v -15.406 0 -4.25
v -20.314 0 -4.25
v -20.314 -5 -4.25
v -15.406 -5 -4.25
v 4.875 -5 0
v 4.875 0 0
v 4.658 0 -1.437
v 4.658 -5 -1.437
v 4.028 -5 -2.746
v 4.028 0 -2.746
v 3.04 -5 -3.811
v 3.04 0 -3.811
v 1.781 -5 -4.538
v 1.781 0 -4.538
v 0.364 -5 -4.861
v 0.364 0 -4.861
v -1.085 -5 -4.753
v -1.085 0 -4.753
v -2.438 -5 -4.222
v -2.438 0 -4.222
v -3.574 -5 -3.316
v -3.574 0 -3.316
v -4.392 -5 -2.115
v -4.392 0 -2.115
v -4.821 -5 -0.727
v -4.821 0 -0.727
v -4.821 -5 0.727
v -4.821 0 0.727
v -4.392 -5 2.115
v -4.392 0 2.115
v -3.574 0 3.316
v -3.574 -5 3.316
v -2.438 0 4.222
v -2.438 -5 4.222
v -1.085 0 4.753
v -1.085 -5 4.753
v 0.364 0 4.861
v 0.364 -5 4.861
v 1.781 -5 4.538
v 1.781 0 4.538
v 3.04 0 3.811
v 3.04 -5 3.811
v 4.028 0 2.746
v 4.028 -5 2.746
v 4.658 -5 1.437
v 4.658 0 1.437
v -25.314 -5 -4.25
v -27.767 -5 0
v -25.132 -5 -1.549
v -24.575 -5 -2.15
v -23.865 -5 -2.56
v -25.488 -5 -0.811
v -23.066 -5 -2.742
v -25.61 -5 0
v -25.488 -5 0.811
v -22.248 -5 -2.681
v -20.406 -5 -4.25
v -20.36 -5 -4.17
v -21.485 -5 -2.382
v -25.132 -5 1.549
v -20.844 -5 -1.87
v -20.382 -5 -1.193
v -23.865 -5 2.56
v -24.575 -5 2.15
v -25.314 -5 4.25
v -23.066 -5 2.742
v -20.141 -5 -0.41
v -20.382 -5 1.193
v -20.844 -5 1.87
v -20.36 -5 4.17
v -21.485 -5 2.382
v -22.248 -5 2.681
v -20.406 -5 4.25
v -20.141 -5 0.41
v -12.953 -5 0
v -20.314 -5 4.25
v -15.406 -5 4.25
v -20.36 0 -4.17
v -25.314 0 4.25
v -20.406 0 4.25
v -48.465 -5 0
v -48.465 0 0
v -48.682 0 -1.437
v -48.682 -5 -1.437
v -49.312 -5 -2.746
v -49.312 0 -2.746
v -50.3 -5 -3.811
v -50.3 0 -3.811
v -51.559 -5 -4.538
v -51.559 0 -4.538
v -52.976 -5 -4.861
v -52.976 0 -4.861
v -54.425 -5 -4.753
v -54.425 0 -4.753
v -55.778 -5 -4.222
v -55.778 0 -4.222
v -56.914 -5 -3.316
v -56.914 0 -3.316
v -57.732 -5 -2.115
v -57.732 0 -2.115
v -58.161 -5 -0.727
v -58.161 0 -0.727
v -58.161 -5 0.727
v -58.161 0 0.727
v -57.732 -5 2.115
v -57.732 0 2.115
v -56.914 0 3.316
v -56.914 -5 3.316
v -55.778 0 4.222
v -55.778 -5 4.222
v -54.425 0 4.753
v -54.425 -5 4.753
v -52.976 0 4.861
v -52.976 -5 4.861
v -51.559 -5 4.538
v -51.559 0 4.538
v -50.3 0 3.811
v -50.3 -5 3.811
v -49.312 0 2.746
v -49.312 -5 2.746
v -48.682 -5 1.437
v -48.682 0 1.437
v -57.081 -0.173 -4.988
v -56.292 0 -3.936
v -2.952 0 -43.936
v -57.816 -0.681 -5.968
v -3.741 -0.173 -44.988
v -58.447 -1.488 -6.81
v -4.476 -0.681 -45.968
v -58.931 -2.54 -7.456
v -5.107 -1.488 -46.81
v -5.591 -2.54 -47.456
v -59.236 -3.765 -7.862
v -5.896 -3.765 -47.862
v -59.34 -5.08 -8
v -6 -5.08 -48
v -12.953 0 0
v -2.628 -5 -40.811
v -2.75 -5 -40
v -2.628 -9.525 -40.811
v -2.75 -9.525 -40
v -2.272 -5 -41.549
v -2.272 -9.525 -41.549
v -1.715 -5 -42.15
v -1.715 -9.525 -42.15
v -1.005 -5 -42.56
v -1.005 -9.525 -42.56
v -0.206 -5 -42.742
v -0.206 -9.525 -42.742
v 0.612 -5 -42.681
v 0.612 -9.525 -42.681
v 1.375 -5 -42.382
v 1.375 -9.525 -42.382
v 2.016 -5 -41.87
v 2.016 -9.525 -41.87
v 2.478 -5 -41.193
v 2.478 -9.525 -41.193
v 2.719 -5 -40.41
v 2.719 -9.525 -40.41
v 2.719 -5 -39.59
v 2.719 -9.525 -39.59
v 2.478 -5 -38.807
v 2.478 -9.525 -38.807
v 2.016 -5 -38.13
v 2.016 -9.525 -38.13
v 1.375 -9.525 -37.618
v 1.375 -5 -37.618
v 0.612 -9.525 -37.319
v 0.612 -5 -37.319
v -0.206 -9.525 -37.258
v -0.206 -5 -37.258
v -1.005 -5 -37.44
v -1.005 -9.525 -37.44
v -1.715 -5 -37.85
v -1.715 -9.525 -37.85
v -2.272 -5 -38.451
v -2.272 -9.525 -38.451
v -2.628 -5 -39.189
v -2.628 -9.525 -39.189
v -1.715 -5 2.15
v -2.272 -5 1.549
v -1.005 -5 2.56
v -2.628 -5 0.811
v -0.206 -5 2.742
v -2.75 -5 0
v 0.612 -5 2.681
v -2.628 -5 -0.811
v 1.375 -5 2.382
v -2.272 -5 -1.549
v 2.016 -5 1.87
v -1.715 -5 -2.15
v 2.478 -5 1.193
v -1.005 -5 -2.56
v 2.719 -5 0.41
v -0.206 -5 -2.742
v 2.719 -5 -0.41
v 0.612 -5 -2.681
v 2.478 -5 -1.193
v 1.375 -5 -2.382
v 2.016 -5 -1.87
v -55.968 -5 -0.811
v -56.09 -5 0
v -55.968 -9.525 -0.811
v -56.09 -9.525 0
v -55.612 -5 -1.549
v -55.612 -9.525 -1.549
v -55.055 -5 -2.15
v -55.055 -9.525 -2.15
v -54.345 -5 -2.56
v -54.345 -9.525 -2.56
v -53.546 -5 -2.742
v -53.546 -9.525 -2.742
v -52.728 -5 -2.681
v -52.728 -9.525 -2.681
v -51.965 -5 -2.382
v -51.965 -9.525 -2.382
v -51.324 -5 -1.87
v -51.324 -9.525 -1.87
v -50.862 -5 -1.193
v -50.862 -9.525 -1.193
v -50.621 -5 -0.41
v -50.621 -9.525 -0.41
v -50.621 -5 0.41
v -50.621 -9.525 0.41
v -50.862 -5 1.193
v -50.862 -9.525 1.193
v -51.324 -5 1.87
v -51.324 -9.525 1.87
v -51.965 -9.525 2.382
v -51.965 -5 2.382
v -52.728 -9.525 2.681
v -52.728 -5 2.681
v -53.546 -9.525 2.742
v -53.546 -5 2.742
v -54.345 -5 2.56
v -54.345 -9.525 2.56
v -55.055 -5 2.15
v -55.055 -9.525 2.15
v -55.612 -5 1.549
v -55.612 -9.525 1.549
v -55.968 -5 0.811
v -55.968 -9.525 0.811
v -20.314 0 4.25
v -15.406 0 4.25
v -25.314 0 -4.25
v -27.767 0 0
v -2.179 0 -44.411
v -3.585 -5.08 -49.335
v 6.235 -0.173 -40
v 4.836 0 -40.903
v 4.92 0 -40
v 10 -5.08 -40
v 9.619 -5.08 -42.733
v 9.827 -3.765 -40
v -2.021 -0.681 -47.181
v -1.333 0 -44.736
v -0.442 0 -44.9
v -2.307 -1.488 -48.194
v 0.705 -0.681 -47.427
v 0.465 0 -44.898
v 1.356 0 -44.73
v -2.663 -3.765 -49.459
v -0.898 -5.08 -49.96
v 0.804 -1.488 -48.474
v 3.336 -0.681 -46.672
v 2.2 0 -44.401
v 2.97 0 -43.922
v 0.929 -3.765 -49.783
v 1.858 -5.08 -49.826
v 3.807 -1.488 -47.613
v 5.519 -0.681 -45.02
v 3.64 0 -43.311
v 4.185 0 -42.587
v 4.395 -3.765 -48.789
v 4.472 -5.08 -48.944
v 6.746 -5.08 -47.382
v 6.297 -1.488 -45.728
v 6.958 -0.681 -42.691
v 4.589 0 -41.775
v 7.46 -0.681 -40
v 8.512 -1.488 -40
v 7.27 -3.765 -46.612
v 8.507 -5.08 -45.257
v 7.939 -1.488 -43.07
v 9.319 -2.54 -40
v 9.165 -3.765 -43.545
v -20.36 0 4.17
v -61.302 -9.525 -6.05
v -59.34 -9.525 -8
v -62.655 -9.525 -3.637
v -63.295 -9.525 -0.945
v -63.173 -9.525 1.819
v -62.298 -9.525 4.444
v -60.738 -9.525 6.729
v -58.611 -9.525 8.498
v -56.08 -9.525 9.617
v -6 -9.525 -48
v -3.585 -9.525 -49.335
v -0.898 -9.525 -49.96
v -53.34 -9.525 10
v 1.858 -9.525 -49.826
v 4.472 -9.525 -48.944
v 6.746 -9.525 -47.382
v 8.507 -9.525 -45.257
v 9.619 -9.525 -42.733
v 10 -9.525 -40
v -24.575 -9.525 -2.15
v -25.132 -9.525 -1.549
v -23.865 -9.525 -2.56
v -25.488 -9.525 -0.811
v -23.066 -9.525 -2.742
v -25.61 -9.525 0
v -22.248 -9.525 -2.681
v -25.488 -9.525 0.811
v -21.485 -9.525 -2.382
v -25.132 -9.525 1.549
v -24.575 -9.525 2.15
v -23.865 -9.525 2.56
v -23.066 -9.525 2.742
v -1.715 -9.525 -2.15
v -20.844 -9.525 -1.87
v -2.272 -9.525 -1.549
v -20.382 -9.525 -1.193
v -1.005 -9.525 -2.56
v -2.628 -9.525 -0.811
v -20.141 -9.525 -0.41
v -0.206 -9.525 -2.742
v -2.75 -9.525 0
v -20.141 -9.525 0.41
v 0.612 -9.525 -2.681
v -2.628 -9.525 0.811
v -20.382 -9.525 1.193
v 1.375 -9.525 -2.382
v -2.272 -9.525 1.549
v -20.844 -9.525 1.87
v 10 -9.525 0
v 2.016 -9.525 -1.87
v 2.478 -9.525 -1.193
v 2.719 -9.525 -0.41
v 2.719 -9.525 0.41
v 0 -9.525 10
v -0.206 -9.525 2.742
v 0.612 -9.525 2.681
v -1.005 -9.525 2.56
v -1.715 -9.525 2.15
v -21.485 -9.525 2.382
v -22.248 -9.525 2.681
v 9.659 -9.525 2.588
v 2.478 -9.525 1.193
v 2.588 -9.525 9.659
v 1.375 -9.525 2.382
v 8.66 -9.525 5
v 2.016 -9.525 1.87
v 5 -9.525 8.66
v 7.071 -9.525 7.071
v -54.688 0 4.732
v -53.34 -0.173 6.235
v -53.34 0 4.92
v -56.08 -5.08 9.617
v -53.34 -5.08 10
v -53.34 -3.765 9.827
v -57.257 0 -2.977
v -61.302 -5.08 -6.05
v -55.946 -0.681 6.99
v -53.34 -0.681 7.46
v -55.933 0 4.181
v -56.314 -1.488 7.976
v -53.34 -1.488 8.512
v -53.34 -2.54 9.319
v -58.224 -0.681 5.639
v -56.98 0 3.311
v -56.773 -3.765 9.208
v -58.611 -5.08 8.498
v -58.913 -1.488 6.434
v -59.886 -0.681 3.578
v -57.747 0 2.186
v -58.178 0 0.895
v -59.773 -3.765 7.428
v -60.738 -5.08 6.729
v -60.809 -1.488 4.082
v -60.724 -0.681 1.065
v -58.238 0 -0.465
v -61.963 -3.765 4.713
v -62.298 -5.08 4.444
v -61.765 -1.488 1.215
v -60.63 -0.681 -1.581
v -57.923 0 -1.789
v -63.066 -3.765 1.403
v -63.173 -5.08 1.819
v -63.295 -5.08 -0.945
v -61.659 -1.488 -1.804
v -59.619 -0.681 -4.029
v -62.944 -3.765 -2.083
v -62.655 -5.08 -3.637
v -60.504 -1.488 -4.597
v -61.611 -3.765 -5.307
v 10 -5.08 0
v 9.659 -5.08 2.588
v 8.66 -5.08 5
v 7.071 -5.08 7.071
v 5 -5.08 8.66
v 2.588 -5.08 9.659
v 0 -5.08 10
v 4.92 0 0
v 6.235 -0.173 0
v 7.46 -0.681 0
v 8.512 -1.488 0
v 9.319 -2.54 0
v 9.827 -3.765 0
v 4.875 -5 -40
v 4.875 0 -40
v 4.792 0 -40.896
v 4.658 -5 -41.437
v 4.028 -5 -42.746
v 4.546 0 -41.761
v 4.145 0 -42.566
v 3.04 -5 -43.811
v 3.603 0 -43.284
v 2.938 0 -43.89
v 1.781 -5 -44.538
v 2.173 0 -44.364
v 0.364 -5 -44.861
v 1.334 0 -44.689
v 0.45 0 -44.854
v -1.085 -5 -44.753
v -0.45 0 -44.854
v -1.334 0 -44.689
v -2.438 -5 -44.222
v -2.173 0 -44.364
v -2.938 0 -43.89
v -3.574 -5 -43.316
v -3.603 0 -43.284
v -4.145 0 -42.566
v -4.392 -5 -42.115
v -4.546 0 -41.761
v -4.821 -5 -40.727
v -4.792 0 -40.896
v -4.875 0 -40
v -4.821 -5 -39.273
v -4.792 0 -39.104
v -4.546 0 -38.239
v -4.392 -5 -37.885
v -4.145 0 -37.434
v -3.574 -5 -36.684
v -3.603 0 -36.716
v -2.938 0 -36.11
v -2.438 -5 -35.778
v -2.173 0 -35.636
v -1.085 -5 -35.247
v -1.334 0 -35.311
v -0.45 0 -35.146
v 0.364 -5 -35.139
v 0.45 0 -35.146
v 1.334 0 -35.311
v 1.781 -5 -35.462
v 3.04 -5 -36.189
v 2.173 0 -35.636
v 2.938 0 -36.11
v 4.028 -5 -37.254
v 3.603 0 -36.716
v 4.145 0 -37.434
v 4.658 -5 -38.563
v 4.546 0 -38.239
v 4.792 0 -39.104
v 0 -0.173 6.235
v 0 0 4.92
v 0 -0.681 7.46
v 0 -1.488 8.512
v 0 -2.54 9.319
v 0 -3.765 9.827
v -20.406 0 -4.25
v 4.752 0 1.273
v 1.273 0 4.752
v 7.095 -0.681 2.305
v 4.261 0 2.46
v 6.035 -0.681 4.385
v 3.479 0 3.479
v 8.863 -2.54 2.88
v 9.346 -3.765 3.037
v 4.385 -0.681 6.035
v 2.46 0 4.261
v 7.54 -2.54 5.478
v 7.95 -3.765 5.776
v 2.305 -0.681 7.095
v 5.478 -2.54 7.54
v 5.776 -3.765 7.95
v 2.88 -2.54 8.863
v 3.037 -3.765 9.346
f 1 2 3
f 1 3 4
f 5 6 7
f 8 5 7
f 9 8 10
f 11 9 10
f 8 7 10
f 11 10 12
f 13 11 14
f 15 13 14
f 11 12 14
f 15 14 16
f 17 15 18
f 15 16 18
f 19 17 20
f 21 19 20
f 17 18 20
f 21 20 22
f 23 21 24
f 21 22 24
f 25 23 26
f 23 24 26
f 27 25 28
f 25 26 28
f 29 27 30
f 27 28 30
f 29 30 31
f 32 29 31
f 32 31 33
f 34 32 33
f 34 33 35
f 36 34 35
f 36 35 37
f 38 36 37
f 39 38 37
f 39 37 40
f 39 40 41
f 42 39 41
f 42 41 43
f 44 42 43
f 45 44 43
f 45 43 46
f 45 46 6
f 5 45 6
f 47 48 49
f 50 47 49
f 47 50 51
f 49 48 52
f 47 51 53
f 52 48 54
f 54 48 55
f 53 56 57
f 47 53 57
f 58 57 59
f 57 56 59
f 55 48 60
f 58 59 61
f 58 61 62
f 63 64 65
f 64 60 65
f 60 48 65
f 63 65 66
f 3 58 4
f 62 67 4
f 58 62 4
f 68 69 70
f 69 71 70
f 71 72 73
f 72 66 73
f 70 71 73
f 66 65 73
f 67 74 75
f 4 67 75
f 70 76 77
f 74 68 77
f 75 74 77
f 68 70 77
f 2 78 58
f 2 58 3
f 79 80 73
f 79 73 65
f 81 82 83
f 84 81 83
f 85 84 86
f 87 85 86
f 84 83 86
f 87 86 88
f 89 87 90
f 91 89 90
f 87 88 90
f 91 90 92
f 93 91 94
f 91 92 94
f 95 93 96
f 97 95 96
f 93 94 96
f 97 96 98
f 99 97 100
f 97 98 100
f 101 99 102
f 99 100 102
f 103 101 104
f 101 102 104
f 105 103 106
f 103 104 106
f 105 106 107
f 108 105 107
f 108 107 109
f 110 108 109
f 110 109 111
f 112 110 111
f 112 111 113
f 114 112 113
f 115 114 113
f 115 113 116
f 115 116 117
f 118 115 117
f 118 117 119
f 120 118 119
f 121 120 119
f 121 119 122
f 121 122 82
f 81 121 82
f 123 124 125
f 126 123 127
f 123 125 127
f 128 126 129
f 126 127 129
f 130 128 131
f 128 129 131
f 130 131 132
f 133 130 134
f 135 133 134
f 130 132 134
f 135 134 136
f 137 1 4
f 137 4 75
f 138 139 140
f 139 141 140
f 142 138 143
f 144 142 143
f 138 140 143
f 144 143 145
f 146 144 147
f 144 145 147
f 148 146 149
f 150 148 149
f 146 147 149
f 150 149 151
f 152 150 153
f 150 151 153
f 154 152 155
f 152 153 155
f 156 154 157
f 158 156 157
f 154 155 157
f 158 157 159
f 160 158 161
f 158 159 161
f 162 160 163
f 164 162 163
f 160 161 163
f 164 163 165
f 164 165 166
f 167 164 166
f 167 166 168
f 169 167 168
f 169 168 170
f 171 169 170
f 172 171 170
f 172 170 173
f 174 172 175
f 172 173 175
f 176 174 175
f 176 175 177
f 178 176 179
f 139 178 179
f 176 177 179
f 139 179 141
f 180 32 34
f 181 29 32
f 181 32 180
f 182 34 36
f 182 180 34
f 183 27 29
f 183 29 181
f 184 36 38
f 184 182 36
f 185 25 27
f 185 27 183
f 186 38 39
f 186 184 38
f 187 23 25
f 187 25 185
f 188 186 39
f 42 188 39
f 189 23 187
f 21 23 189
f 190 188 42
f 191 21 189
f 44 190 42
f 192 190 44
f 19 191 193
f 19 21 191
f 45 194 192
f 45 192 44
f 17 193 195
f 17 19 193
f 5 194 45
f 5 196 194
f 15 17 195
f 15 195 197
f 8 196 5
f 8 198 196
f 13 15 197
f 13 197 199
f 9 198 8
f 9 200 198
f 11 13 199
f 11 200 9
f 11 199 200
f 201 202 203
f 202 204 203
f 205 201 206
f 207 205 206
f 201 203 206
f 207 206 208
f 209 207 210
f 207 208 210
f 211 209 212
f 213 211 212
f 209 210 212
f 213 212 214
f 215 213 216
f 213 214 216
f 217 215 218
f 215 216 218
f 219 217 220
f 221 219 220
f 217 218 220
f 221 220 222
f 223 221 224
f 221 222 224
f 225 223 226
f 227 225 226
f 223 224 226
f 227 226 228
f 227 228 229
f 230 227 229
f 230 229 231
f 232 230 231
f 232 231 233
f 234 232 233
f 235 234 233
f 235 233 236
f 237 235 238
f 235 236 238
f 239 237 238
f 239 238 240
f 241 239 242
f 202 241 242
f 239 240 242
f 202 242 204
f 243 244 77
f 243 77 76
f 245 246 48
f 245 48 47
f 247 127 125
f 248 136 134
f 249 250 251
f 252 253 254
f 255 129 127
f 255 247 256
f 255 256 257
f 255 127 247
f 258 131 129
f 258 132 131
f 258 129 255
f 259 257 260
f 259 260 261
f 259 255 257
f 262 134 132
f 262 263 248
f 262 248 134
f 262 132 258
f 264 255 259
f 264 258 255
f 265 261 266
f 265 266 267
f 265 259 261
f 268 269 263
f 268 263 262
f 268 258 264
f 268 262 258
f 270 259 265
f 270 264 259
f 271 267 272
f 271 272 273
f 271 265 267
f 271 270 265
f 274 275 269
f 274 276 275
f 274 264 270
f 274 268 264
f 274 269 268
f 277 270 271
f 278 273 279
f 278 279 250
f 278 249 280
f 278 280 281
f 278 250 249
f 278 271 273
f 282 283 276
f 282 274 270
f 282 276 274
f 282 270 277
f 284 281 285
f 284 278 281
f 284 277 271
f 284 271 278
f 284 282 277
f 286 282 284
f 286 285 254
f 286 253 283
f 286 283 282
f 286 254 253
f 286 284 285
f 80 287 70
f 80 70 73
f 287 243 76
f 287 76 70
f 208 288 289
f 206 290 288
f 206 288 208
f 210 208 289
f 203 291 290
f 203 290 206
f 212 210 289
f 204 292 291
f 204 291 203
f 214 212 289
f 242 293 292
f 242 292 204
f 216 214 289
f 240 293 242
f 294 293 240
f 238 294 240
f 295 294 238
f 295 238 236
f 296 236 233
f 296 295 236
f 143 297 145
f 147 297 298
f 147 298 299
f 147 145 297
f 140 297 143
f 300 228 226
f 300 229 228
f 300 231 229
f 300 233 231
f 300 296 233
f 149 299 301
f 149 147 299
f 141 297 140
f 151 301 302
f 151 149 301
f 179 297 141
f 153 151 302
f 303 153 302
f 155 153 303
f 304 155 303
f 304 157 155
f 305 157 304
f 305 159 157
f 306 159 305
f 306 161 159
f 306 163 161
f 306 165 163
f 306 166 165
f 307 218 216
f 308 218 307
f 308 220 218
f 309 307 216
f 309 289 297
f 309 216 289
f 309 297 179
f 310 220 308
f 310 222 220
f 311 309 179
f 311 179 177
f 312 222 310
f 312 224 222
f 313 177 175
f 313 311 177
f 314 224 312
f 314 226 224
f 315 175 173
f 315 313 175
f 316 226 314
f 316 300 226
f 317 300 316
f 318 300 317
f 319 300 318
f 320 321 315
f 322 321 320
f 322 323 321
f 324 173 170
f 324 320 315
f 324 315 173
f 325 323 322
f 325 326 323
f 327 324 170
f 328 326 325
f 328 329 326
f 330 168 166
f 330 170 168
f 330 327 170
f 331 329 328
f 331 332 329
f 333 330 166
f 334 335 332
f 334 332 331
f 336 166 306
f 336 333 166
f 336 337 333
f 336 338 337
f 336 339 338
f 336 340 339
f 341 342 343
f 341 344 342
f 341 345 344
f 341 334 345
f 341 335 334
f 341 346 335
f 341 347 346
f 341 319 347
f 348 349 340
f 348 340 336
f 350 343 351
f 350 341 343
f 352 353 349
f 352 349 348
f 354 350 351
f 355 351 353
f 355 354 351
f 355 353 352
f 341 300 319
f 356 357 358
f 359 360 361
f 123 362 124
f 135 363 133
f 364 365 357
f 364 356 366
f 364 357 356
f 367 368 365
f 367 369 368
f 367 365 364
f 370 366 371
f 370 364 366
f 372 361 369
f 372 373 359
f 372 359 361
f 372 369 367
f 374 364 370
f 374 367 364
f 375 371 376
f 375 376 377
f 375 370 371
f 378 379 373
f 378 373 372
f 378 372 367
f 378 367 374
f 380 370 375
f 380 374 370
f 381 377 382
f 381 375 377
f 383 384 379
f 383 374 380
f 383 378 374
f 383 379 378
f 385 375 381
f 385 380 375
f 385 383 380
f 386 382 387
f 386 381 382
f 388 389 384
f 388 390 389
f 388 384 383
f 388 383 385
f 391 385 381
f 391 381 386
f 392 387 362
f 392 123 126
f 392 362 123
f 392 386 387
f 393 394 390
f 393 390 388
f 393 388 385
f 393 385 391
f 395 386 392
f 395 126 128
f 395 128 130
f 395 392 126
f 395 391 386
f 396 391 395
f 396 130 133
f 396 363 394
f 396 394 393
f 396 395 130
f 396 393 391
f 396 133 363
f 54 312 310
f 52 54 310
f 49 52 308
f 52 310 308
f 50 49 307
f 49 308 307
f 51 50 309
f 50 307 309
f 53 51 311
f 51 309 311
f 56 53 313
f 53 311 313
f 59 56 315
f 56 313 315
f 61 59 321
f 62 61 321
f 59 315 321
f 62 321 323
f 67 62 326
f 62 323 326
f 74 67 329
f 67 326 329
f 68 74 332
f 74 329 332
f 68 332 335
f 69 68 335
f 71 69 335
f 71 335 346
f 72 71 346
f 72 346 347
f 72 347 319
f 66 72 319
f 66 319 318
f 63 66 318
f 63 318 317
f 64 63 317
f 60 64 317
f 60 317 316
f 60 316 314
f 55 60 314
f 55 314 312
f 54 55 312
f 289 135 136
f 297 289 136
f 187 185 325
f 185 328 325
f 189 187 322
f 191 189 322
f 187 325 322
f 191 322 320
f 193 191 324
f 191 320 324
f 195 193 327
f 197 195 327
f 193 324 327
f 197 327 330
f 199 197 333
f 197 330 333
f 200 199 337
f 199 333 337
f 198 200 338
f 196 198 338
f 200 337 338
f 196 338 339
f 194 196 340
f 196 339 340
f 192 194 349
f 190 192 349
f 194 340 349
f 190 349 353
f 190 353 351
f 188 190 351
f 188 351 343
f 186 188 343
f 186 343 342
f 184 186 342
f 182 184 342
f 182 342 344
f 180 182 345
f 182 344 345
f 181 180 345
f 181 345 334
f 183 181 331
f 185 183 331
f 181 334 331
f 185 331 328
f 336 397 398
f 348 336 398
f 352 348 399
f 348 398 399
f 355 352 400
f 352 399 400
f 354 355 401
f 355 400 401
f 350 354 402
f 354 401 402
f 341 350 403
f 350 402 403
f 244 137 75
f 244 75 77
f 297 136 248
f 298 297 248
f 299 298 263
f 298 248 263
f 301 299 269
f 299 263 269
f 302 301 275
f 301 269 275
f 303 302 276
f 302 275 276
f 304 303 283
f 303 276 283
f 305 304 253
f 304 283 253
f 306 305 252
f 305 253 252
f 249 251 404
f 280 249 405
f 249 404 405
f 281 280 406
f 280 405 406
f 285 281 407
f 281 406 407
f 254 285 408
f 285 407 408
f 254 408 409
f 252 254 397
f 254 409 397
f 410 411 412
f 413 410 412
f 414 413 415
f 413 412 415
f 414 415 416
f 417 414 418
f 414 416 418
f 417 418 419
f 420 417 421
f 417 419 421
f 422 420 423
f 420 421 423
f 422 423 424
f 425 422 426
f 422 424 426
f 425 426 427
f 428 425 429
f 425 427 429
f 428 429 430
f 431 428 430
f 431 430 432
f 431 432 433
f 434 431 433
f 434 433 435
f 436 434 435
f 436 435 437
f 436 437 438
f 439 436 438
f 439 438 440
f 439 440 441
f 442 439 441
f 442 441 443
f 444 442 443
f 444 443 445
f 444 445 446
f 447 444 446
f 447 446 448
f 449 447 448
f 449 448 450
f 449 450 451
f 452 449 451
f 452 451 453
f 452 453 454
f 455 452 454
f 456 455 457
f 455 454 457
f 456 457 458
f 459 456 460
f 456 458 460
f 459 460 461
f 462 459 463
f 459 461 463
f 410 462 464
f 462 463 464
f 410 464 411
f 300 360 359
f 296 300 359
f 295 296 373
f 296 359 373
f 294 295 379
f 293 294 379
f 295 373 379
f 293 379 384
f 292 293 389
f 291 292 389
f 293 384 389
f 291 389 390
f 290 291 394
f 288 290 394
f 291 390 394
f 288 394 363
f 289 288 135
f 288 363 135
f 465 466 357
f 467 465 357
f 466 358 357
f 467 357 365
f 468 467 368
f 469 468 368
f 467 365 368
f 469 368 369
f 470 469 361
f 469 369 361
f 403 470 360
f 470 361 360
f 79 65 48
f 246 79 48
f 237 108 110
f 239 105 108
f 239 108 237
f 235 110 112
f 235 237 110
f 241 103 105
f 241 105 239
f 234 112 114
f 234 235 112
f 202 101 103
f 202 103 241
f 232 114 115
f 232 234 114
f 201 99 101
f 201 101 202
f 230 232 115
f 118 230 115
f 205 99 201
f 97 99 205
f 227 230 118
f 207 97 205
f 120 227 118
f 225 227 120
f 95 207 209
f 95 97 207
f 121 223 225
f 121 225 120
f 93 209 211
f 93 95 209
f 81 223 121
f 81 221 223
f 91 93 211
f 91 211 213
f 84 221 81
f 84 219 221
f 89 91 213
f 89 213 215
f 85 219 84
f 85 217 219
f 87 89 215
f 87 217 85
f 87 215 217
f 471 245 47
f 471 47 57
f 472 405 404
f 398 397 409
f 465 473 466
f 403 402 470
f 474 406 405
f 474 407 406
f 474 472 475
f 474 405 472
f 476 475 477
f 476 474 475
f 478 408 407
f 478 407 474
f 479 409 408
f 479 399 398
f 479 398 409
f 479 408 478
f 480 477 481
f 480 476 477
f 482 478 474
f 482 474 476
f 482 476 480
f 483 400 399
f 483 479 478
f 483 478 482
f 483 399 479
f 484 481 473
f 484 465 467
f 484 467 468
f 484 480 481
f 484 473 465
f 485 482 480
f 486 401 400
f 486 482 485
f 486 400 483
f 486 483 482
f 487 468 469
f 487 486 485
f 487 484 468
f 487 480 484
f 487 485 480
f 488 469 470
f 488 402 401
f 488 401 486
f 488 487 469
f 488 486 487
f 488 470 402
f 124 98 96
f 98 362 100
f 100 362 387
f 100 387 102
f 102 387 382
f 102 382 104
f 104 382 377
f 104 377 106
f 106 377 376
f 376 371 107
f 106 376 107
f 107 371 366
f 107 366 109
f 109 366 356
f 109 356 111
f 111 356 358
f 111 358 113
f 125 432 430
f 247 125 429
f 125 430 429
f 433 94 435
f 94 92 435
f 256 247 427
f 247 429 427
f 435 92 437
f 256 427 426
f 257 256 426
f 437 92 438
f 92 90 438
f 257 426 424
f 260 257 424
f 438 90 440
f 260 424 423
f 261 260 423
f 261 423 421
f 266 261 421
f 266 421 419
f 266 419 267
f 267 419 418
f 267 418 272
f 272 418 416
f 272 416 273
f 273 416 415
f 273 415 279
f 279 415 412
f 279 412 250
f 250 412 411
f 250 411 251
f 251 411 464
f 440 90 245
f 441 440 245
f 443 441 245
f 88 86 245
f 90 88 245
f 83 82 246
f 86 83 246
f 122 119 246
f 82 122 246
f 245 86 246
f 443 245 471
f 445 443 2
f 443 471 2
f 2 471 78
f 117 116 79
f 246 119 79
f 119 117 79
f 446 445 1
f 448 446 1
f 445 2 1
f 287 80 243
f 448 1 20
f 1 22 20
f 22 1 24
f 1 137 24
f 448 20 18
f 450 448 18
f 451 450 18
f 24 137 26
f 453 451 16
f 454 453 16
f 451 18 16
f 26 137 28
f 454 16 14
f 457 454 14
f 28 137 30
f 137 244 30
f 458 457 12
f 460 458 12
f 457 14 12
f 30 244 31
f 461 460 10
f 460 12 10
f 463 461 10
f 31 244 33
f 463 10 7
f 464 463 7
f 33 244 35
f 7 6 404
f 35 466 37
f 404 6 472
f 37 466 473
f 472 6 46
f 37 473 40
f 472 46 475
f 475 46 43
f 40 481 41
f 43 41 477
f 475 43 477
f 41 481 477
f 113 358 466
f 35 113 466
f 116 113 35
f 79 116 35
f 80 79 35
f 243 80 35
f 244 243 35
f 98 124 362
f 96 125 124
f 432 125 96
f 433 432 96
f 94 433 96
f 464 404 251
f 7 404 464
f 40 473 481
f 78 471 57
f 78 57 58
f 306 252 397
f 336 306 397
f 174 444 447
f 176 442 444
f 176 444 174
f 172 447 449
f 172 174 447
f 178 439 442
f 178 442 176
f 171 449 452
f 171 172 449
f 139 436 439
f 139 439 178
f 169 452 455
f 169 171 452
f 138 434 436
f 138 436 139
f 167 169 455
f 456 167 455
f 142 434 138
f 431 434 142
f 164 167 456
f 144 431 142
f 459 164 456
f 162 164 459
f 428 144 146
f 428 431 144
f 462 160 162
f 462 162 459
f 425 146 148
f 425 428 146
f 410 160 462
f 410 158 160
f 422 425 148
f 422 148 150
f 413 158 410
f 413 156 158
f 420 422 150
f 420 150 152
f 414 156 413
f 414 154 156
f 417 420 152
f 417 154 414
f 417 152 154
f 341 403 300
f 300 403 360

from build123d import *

# Parameters (mm, degrees)
F1_DEPTH       = 9.525
F2_D           = 5.5
F2_CBORE_D     = 9.75
F2_CBORE_DEPTH = 5
F3_R           = 5.08
F4_DEPTH       = 5
F5_D           = 5.5


# Not quite as in the source:
# - a feature names something its author has since deleted; it is built from what else it names


with BuildPart() as f1:
    # F0 (on Front) → F1 (new body)
    with BuildSketch(Plane.XZ):
        with BuildLine():
            Line((10, -40), (10, 0))
            ThreePointArc((10, 0), (7.0710678119, 7.0710678119), (0, 10))
            Line((0, 10), (-53.34, 10))
            ThreePointArc((-53.34, 10), (-62.826927837, 3.1619930765), (-59.3395200276, -8.0003599568))
            Line((-59.3395200276, -8.0003599568), (-5.9995200276, -48.0003599568))
            ThreePointArc((-5.9995200276, -48.0003599568), (4.4724042597, -48.9441377526), (10, -40))
        make_face()
        Polygon((-20.36, -4.1698729811), (-20.4062613559, -4.25), (-25.3137386441, -4.25), (-27.7674772881, 0), (-25.3137386441, 4.25), (-20.4062613559, 4.25), (-20.36, 4.1698729811), (-20.3137386441, 4.25), (-15.4062613559, 4.25), (-12.9525227119, 0), (-15.4062613559, -4.25), (-20.3137386441, -4.25), align=None, mode=Mode.SUBTRACT)
        Polygon((-25.3137386441, -4.25), (-20.4062613559, -4.25), (-20.36, -4.1698729811), (-22.7674772881, 0), (-20.36, 4.1698729811), (-20.4062613559, 4.25), (-25.3137386441, 4.25), (-27.7674772881, 0), align=None)
        Polygon((-17.9525227119, 0), (-20.36, -4.1698729811), (-20.3137386441, -4.25), (-15.4062613559, -4.25), (-12.9525227119, 0), (-15.4062613559, 4.25), (-20.3137386441, 4.25), (-20.36, 4.1698729811), align=None)
        Polygon((-22.7674772881, 0), (-20.36, -4.1698729811), (-17.9525227119, 0), (-20.36, 4.1698729811), align=None)
    extrude(amount=F1_DEPTH)

    # F2 (through all)
    with Locations(Plane(origin=(0, 0, 0), x_dir=(1, 0, 0), z_dir=(0, 1, 0))):
        with Locations((0, 0), (0, 40), (-53.34, 0)):
            CounterBoreHole(F2_D / 2, F2_CBORE_D / 2, F2_CBORE_DEPTH)

    # F3
    f3_edges = [f1.edges().sort_by_distance(p)[0] for p in [
        (-26.67, 0, 10),
    ]]
    fillet(f3_edges, radius=F3_R)

    # F0 (on Front) → F4 (cut)
    with BuildSketch(Plane.XZ):
        Polygon((-25.3137386441, -4.25), (-20.4062613559, -4.25), (-20.36, -4.1698729811), (-22.7674772881, 0), (-20.36, 4.1698729811), (-20.4062613559, 4.25), (-25.3137386441, 4.25), (-27.7674772881, 0), align=None)
        Polygon((-22.7674772881, 0), (-20.36, -4.1698729811), (-17.9525227119, 0), (-20.36, 4.1698729811), align=None)
        Polygon((-17.9525227119, 0), (-20.36, -4.1698729811), (-20.3137386441, -4.25), (-15.4062613559, -4.25), (-12.9525227119, 0), (-15.4062613559, 4.25), (-20.3137386441, 4.25), (-20.36, 4.1698729811), align=None)
    extrude(amount=F4_DEPTH, mode=Mode.SUBTRACT)

    # F5 (through all)
    with Locations(Plane(origin=(0, 0, 0), x_dir=(1, 0, 0), z_dir=(0, 1, 0))):
        with Locations((-22.86, 0)):
            Hole(F5_D / 2)


solid = f1.part
